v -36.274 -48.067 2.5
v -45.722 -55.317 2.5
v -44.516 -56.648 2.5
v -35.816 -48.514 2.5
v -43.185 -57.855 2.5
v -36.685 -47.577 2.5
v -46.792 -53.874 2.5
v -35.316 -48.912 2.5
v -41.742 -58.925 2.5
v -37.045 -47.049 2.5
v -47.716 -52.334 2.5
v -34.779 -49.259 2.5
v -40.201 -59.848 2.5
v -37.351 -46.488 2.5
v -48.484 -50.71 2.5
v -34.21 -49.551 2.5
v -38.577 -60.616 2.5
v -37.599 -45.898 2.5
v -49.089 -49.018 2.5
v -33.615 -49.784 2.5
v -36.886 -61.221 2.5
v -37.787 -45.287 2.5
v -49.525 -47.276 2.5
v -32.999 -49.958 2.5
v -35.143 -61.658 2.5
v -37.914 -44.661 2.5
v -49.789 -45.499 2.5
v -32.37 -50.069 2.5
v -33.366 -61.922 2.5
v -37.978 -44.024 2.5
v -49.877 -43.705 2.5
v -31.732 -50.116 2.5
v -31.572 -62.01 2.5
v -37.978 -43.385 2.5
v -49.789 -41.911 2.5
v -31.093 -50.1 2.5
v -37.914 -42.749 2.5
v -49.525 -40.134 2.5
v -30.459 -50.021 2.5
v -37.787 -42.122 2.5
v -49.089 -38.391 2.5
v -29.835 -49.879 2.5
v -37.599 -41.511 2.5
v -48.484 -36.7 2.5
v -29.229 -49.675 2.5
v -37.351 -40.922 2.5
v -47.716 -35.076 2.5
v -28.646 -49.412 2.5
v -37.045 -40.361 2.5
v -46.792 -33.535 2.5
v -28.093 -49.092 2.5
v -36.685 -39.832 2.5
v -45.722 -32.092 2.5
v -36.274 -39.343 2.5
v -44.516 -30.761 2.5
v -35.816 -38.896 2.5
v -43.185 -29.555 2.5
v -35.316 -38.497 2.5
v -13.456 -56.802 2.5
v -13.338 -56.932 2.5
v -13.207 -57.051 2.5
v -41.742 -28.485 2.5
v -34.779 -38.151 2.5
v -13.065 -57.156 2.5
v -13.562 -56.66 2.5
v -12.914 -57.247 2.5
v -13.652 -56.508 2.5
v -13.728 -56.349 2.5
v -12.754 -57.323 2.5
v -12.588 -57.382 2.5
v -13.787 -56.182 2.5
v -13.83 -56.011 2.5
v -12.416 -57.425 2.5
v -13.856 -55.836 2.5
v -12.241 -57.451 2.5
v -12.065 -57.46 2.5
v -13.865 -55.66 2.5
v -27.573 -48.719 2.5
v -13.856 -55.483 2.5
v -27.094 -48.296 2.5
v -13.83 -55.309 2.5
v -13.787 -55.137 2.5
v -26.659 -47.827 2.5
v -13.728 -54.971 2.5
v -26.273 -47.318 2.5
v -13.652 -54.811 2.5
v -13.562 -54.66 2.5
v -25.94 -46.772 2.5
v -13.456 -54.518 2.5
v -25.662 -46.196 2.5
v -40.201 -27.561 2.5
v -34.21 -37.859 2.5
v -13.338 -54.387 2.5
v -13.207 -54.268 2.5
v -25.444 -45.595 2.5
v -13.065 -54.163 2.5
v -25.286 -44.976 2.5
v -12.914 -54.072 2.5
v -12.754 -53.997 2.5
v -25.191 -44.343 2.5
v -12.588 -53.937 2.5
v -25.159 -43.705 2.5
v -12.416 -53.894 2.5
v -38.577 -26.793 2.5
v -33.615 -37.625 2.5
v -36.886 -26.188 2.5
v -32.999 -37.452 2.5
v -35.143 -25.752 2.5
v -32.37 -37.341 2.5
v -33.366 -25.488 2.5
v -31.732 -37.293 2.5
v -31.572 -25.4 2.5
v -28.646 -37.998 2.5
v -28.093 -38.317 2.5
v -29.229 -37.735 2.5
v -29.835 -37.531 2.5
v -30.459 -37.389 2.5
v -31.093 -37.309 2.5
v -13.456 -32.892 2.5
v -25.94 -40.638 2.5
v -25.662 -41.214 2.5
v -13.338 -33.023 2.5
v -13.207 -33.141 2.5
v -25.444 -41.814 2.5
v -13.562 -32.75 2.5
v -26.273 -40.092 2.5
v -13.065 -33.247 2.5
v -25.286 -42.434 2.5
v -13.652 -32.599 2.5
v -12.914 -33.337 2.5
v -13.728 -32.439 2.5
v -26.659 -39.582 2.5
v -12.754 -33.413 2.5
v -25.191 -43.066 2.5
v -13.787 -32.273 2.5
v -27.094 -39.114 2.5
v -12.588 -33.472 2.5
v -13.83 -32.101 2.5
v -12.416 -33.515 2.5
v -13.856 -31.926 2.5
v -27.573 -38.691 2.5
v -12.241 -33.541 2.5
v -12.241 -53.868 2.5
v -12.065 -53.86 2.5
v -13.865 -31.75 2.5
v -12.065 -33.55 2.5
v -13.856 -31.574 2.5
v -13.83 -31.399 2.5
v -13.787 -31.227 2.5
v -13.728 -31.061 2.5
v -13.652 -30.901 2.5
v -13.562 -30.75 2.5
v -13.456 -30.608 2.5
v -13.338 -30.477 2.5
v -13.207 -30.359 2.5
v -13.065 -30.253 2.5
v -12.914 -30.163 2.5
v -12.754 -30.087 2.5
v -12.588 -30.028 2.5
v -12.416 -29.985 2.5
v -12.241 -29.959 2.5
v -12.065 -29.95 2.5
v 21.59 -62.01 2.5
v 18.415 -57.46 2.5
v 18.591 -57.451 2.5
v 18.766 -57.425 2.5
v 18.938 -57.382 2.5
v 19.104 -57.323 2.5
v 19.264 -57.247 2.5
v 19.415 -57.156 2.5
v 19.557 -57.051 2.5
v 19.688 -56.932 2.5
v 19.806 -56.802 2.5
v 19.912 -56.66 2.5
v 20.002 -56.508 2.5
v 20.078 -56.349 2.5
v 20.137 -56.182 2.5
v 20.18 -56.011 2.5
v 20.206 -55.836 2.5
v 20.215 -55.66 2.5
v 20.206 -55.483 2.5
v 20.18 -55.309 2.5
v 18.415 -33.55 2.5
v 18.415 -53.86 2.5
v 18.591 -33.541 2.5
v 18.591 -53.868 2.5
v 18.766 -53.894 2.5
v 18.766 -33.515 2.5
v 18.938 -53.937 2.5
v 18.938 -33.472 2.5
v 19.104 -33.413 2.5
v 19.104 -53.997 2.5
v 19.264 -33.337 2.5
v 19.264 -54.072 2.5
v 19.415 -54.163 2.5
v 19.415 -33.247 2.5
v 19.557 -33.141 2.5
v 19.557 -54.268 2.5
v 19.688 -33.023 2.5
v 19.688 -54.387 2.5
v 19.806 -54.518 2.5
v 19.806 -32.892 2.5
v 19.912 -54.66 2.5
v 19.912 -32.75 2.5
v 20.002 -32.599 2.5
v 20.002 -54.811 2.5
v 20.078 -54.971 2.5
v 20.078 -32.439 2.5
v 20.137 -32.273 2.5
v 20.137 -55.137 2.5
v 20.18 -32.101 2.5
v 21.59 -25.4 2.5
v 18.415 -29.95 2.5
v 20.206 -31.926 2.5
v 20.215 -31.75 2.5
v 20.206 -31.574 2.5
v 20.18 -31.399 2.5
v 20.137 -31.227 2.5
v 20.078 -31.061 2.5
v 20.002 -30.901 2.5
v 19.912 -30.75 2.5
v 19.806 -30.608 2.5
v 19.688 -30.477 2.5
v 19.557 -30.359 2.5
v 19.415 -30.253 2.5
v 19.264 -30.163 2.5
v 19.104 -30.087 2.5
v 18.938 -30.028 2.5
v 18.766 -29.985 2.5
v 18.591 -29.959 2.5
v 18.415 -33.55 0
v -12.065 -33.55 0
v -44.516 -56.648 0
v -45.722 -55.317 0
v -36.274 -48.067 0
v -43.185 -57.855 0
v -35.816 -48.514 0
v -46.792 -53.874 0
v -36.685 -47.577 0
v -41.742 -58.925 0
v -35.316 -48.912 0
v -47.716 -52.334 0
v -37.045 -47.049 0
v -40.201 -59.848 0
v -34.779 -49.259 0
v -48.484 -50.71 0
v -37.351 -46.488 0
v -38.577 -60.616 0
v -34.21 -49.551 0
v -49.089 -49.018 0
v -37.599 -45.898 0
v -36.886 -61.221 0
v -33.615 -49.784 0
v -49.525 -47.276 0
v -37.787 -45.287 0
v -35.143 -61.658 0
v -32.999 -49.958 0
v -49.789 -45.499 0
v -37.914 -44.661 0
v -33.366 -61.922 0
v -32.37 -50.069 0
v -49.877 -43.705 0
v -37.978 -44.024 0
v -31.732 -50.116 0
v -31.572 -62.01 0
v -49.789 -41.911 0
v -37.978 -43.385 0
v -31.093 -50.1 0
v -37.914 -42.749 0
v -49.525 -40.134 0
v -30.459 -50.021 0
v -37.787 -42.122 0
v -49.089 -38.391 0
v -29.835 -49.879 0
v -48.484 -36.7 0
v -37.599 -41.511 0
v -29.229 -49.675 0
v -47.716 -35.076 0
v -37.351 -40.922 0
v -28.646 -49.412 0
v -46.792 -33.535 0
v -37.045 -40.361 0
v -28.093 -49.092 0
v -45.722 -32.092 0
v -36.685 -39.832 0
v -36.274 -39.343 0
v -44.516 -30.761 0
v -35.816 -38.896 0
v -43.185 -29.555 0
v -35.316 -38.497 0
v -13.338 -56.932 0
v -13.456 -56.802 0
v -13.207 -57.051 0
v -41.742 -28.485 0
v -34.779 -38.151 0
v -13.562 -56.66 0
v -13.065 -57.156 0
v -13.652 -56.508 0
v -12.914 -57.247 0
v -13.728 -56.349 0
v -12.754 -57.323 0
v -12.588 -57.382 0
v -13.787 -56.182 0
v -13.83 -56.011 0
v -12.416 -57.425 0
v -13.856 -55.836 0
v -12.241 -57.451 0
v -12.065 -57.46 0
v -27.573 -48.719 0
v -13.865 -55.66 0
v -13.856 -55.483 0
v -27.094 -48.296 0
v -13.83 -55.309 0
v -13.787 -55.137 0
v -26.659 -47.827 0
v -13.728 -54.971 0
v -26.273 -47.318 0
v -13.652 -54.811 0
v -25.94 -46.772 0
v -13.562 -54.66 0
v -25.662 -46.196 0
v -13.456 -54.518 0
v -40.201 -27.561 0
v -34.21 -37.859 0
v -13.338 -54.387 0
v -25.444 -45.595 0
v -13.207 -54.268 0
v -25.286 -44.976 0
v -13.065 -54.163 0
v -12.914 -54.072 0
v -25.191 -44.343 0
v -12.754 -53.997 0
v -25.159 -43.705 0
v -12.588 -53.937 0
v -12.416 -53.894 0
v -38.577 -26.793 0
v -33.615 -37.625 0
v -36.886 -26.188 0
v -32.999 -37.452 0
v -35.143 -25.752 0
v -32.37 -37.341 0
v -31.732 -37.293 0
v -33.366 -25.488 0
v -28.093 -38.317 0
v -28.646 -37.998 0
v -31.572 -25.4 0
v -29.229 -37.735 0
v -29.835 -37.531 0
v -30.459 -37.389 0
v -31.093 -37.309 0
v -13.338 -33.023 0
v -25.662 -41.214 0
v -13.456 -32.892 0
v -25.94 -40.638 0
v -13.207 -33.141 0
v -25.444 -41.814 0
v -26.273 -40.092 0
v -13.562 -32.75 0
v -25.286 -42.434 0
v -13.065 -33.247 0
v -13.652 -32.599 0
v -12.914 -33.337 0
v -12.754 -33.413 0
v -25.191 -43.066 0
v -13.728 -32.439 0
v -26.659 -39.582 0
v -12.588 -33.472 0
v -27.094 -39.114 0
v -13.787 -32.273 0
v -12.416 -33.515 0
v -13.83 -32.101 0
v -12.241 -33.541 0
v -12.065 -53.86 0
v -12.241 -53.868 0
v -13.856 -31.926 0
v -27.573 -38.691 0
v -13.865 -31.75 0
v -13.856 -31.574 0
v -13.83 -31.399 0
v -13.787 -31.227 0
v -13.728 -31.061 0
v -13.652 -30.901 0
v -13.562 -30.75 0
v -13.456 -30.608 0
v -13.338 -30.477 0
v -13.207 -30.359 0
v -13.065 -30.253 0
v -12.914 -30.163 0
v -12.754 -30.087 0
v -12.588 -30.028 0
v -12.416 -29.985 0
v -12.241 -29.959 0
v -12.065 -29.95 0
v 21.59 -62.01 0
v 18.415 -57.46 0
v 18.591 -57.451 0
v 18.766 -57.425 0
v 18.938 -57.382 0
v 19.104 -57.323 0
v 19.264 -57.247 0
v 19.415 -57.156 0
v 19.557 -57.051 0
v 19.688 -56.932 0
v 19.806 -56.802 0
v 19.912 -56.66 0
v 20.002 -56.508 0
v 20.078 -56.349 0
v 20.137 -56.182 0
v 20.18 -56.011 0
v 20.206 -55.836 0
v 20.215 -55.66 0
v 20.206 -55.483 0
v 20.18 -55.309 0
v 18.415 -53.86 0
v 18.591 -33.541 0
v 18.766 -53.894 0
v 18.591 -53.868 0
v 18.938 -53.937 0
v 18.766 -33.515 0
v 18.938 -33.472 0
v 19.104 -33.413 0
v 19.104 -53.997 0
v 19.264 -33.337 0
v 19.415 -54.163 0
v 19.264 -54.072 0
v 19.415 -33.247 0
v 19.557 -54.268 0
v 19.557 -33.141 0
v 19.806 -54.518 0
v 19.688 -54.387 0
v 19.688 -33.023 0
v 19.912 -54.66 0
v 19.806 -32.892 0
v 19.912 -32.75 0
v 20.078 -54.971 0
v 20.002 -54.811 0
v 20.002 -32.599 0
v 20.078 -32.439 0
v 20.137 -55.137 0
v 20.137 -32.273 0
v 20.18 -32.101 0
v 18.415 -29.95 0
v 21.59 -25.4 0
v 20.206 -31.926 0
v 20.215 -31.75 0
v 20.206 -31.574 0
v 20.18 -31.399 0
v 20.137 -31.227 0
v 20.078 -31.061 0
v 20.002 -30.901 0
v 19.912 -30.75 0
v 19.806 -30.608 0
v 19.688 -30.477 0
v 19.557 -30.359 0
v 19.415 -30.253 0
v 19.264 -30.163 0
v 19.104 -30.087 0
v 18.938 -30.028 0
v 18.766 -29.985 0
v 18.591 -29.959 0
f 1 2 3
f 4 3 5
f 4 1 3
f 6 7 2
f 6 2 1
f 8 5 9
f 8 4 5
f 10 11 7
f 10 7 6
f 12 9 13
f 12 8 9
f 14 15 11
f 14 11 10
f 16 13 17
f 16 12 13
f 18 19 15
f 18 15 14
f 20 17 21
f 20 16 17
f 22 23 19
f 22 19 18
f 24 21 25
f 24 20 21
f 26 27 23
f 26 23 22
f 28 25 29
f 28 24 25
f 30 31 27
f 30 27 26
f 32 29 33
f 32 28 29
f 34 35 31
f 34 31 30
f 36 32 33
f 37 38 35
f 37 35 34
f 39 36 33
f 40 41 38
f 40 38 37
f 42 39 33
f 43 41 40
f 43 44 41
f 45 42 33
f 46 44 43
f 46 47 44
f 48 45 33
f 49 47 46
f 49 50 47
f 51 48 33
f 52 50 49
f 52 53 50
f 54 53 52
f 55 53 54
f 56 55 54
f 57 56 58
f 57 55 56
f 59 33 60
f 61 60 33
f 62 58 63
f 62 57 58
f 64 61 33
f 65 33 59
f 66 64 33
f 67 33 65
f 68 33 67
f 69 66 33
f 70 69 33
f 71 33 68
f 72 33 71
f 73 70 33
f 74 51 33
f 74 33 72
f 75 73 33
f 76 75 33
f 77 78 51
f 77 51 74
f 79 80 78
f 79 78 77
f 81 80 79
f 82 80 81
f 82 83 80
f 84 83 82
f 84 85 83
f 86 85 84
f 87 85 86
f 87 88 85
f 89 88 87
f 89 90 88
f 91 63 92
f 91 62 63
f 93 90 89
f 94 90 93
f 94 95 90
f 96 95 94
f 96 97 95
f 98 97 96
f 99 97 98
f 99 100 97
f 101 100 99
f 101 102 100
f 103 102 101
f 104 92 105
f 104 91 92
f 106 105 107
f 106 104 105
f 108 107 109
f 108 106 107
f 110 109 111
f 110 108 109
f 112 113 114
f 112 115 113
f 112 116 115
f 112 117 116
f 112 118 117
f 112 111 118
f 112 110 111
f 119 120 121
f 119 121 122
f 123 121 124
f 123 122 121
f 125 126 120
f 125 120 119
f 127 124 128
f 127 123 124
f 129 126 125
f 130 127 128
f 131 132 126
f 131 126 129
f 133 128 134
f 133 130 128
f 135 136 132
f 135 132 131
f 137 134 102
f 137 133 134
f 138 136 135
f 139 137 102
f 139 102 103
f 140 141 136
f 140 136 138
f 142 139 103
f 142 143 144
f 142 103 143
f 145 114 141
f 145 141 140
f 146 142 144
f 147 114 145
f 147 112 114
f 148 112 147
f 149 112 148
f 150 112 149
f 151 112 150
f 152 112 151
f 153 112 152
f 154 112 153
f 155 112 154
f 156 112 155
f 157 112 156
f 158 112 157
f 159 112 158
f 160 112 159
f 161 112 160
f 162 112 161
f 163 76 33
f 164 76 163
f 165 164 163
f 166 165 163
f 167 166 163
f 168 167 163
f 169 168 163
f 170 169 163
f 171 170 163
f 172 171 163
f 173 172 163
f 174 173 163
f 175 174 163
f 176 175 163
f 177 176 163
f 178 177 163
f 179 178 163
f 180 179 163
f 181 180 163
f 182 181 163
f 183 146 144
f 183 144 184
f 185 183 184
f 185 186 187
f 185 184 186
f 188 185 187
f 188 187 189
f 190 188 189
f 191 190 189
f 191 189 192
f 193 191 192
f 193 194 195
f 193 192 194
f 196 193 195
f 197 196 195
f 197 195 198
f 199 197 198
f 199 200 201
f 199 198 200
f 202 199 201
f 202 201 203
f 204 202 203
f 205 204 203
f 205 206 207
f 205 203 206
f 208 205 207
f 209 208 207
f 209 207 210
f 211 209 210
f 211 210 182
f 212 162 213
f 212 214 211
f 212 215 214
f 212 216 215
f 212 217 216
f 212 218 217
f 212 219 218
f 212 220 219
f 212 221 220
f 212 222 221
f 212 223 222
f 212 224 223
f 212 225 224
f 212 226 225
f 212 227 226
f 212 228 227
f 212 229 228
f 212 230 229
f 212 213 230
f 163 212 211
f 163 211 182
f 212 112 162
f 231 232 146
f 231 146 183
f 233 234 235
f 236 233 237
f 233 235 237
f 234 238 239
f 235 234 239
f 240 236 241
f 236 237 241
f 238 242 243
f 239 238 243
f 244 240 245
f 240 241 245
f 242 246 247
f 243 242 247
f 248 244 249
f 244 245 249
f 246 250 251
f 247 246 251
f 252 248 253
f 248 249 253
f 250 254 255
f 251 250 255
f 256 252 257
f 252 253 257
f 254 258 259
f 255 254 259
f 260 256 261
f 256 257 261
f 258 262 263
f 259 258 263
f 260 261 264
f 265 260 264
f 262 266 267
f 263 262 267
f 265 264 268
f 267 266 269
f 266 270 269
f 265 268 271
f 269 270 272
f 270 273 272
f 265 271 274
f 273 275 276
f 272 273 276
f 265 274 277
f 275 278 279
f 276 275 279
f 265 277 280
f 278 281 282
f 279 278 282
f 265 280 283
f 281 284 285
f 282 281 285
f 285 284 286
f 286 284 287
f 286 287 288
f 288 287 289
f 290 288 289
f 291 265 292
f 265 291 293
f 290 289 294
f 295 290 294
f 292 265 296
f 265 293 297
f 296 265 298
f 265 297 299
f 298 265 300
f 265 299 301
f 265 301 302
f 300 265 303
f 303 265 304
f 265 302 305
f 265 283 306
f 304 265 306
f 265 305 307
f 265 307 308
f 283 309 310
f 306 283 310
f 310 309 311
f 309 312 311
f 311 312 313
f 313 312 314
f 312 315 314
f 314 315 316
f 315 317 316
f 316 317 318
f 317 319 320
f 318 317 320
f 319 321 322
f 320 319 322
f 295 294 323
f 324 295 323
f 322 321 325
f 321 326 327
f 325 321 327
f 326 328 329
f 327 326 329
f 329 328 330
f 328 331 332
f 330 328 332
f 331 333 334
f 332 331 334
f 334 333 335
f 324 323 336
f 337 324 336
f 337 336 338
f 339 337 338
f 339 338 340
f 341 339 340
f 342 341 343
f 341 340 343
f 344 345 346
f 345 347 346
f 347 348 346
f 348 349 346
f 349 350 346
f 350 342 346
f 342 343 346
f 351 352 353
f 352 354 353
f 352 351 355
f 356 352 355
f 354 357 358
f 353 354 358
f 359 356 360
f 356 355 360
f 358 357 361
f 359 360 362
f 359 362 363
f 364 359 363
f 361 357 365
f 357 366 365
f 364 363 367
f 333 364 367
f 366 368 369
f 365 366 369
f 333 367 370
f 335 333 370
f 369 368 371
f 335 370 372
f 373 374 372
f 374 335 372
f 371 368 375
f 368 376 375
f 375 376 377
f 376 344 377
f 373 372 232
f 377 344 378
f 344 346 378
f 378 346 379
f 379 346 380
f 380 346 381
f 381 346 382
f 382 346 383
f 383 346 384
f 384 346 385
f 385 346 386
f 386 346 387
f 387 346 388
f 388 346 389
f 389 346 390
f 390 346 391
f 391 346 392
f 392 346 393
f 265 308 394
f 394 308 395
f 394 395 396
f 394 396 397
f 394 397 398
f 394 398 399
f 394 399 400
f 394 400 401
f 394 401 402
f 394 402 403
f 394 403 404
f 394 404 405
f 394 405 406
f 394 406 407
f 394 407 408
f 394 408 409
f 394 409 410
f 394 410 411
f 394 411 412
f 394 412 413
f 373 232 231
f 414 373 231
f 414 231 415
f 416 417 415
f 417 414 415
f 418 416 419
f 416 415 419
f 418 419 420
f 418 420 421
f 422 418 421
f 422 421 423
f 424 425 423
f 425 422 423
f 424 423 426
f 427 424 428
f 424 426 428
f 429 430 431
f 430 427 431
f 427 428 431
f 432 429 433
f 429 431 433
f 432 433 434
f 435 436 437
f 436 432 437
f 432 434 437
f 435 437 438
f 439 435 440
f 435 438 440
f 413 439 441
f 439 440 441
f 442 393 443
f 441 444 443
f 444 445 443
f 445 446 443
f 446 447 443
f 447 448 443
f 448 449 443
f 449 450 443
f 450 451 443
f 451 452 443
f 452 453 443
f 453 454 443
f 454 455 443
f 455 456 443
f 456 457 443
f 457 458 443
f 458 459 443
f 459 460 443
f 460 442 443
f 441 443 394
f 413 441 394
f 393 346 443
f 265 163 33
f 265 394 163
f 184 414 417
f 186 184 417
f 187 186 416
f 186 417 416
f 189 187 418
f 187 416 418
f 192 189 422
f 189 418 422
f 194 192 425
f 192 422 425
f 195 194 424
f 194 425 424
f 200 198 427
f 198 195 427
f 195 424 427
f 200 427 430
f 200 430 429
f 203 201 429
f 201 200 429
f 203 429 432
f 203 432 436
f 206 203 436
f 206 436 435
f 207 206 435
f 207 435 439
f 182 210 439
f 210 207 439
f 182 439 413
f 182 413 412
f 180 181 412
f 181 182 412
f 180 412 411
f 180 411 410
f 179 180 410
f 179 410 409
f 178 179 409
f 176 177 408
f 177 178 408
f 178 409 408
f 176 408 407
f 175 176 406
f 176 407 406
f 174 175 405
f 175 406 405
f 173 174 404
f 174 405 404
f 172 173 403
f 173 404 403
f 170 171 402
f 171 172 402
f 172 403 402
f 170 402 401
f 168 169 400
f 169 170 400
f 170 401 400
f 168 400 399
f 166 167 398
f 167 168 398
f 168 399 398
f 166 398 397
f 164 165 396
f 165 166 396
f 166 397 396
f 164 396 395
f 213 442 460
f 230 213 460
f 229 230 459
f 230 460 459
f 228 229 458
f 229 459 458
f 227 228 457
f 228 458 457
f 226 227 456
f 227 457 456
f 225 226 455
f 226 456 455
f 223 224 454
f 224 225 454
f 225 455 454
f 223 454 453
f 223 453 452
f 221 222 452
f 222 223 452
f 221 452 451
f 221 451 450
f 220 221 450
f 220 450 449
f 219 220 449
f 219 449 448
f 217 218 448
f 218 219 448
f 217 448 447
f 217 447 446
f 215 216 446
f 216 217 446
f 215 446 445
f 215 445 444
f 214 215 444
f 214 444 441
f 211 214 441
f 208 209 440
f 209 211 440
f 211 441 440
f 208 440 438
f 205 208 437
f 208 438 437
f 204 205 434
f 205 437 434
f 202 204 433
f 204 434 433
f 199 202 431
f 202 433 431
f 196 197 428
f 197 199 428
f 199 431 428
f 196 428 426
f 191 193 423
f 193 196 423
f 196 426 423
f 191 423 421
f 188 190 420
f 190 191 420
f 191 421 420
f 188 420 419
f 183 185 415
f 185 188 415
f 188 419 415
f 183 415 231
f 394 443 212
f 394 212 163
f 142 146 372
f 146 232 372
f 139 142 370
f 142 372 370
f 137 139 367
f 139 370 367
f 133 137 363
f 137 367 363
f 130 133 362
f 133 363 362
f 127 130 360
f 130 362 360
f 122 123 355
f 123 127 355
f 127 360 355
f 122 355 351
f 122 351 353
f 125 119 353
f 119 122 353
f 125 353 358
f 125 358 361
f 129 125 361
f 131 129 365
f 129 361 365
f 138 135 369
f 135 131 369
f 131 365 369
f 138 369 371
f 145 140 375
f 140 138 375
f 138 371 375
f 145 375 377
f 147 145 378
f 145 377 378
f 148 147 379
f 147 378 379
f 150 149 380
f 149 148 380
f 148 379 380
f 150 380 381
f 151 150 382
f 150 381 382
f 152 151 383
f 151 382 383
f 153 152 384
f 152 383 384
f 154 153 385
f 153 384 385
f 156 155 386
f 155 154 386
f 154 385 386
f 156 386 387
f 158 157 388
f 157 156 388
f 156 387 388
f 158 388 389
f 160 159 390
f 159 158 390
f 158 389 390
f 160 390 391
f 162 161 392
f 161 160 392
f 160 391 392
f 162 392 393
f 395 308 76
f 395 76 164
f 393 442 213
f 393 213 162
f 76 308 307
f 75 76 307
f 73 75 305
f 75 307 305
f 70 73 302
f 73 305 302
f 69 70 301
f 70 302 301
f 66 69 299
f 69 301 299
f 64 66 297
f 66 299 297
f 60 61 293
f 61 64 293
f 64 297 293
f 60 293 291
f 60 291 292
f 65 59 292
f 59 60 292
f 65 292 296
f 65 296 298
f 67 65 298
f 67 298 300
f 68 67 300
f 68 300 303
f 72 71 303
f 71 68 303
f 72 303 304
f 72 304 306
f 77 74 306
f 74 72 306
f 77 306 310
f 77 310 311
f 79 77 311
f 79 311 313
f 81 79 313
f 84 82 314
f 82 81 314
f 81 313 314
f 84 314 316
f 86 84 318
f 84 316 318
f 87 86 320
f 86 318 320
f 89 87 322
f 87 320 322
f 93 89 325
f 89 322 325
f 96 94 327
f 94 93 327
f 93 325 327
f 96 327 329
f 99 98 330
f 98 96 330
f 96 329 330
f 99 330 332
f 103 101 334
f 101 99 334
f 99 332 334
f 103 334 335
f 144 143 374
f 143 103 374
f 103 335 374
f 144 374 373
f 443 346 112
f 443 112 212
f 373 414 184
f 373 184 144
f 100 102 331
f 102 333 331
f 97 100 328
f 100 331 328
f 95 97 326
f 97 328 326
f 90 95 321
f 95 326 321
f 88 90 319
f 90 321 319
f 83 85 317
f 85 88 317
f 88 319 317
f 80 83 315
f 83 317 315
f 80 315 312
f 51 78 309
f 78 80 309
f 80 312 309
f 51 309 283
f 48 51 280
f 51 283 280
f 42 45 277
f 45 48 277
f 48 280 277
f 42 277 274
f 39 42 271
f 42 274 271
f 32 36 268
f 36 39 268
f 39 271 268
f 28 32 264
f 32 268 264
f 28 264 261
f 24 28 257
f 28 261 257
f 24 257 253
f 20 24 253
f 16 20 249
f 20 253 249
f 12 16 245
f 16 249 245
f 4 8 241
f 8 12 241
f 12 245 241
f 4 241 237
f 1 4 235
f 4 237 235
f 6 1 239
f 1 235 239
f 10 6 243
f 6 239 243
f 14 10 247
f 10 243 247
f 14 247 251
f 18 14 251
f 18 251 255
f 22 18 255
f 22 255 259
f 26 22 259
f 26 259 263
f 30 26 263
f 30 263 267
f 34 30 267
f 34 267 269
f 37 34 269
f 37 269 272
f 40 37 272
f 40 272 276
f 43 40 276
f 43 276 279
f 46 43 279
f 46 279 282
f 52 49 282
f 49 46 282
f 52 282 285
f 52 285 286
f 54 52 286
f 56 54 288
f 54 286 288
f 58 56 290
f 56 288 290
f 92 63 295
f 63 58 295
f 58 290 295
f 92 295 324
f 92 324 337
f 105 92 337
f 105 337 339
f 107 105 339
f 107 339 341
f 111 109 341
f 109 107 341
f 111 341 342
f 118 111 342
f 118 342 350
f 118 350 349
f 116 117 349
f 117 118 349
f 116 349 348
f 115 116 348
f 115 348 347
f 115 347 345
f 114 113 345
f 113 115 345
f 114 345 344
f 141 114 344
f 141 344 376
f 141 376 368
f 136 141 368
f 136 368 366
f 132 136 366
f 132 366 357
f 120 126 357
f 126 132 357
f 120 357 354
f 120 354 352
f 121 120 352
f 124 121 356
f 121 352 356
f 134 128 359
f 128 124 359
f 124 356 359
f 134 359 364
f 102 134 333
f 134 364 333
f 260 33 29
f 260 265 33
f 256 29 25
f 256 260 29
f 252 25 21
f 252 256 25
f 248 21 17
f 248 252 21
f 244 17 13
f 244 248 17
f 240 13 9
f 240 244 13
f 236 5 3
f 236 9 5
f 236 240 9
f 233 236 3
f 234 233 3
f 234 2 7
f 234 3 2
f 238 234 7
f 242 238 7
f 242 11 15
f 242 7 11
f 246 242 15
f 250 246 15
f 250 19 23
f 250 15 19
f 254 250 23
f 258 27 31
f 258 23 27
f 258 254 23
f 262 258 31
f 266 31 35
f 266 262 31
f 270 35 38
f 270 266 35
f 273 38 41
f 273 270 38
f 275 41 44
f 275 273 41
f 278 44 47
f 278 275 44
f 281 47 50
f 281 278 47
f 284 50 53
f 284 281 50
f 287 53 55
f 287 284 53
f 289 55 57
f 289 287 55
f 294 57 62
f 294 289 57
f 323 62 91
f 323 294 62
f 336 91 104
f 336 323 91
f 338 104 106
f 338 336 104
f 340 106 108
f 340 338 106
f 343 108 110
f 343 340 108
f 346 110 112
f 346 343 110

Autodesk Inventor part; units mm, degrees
ref_plane "YZ Plane" through (0, 0, 0) normal (1, 0, 0) x (0, 1, 0)
ref_plane "XZ Plane" through (0, 0, 0) normal (0, 1, 0) x (-1, 0, 0)
ref_plane "XY Plane" through (0, 0, 0) normal (0, 0, 1) x (1, 0, 0)
ref_plane "Work Plane1" through (0, 0, 0) normal (0, 0, 1) x (1, 0, 0)
sketch "Sketch1" plane through (0, 0, 0) normal (0, 0, 1) x (1, 0, 0)
  line L0 (11.43, 0) -> (11.43, -63.5) construction
  line L1 (0, 0) -> (11.43, 0) construction
  line L2 (0, 0) -> (0, -63.5) construction
  line L3 (7.44, -34.7378) -> (0, -34.7378) construction
  circle A0 centre (5.715, -31.75) radius 1.7 construction
  circle A1 centre (-31.5722, -43.7048) radius 6.4135
  line L4 (0, -63.5) -> (11.43, -63.5) construction
  circle A2 centre (5.715, -55.6597) radius 1.7 construction
  line L5 (21.59, -62.0097) -> (-31.5722, -62.0097)
  line L6 (-31.5722, -25.4) -> (21.59, -25.4)
  line L7 (21.59, -25.4) -> (21.59, -62.0097)
  arc A3 (-31.5722, -25.4) -> (-31.5722, -62.0097) centre (-31.5722, -43.7048) ccw
  line L8 (18.415, -31.75) -> (-12.065, -31.75) construction
  line L9 (18.415, -29.95) -> (-12.065, -29.95)
  line L10 (-12.065, -33.55) -> (18.415, -33.55)
  arc A4 (18.415, -33.55) -> (18.415, -29.95) centre (18.415, -31.75) ccw
  arc A5 (-12.065, -29.95) -> (-12.065, -33.55) centre (-12.065, -31.75) ccw
  line L11 (18.415, -55.6597) -> (-12.065, -55.6597) construction
  line L12 (18.415, -53.8597) -> (-12.065, -53.8597)
  line L13 (-12.065, -57.4597) -> (18.415, -57.4597)
  arc A6 (18.415, -57.4597) -> (18.415, -53.8597) centre (18.415, -55.6597) ccw
  arc A7 (-12.065, -53.8597) -> (-12.065, -57.4597) centre (-12.065, -55.6597) ccw
  point P0 (3.175, -31.75)
  point P1 (3.175, -55.6597)
extrude "Extrusion1" add sketch "Sketch1" along normal blind 2.5
equation "\"d3\" = d4 + 0.5 * d5"
equation "\"d4\" = 7.8403"
equation "\"d5\" = 23.9097"
properties part number "driven wheel arm"
